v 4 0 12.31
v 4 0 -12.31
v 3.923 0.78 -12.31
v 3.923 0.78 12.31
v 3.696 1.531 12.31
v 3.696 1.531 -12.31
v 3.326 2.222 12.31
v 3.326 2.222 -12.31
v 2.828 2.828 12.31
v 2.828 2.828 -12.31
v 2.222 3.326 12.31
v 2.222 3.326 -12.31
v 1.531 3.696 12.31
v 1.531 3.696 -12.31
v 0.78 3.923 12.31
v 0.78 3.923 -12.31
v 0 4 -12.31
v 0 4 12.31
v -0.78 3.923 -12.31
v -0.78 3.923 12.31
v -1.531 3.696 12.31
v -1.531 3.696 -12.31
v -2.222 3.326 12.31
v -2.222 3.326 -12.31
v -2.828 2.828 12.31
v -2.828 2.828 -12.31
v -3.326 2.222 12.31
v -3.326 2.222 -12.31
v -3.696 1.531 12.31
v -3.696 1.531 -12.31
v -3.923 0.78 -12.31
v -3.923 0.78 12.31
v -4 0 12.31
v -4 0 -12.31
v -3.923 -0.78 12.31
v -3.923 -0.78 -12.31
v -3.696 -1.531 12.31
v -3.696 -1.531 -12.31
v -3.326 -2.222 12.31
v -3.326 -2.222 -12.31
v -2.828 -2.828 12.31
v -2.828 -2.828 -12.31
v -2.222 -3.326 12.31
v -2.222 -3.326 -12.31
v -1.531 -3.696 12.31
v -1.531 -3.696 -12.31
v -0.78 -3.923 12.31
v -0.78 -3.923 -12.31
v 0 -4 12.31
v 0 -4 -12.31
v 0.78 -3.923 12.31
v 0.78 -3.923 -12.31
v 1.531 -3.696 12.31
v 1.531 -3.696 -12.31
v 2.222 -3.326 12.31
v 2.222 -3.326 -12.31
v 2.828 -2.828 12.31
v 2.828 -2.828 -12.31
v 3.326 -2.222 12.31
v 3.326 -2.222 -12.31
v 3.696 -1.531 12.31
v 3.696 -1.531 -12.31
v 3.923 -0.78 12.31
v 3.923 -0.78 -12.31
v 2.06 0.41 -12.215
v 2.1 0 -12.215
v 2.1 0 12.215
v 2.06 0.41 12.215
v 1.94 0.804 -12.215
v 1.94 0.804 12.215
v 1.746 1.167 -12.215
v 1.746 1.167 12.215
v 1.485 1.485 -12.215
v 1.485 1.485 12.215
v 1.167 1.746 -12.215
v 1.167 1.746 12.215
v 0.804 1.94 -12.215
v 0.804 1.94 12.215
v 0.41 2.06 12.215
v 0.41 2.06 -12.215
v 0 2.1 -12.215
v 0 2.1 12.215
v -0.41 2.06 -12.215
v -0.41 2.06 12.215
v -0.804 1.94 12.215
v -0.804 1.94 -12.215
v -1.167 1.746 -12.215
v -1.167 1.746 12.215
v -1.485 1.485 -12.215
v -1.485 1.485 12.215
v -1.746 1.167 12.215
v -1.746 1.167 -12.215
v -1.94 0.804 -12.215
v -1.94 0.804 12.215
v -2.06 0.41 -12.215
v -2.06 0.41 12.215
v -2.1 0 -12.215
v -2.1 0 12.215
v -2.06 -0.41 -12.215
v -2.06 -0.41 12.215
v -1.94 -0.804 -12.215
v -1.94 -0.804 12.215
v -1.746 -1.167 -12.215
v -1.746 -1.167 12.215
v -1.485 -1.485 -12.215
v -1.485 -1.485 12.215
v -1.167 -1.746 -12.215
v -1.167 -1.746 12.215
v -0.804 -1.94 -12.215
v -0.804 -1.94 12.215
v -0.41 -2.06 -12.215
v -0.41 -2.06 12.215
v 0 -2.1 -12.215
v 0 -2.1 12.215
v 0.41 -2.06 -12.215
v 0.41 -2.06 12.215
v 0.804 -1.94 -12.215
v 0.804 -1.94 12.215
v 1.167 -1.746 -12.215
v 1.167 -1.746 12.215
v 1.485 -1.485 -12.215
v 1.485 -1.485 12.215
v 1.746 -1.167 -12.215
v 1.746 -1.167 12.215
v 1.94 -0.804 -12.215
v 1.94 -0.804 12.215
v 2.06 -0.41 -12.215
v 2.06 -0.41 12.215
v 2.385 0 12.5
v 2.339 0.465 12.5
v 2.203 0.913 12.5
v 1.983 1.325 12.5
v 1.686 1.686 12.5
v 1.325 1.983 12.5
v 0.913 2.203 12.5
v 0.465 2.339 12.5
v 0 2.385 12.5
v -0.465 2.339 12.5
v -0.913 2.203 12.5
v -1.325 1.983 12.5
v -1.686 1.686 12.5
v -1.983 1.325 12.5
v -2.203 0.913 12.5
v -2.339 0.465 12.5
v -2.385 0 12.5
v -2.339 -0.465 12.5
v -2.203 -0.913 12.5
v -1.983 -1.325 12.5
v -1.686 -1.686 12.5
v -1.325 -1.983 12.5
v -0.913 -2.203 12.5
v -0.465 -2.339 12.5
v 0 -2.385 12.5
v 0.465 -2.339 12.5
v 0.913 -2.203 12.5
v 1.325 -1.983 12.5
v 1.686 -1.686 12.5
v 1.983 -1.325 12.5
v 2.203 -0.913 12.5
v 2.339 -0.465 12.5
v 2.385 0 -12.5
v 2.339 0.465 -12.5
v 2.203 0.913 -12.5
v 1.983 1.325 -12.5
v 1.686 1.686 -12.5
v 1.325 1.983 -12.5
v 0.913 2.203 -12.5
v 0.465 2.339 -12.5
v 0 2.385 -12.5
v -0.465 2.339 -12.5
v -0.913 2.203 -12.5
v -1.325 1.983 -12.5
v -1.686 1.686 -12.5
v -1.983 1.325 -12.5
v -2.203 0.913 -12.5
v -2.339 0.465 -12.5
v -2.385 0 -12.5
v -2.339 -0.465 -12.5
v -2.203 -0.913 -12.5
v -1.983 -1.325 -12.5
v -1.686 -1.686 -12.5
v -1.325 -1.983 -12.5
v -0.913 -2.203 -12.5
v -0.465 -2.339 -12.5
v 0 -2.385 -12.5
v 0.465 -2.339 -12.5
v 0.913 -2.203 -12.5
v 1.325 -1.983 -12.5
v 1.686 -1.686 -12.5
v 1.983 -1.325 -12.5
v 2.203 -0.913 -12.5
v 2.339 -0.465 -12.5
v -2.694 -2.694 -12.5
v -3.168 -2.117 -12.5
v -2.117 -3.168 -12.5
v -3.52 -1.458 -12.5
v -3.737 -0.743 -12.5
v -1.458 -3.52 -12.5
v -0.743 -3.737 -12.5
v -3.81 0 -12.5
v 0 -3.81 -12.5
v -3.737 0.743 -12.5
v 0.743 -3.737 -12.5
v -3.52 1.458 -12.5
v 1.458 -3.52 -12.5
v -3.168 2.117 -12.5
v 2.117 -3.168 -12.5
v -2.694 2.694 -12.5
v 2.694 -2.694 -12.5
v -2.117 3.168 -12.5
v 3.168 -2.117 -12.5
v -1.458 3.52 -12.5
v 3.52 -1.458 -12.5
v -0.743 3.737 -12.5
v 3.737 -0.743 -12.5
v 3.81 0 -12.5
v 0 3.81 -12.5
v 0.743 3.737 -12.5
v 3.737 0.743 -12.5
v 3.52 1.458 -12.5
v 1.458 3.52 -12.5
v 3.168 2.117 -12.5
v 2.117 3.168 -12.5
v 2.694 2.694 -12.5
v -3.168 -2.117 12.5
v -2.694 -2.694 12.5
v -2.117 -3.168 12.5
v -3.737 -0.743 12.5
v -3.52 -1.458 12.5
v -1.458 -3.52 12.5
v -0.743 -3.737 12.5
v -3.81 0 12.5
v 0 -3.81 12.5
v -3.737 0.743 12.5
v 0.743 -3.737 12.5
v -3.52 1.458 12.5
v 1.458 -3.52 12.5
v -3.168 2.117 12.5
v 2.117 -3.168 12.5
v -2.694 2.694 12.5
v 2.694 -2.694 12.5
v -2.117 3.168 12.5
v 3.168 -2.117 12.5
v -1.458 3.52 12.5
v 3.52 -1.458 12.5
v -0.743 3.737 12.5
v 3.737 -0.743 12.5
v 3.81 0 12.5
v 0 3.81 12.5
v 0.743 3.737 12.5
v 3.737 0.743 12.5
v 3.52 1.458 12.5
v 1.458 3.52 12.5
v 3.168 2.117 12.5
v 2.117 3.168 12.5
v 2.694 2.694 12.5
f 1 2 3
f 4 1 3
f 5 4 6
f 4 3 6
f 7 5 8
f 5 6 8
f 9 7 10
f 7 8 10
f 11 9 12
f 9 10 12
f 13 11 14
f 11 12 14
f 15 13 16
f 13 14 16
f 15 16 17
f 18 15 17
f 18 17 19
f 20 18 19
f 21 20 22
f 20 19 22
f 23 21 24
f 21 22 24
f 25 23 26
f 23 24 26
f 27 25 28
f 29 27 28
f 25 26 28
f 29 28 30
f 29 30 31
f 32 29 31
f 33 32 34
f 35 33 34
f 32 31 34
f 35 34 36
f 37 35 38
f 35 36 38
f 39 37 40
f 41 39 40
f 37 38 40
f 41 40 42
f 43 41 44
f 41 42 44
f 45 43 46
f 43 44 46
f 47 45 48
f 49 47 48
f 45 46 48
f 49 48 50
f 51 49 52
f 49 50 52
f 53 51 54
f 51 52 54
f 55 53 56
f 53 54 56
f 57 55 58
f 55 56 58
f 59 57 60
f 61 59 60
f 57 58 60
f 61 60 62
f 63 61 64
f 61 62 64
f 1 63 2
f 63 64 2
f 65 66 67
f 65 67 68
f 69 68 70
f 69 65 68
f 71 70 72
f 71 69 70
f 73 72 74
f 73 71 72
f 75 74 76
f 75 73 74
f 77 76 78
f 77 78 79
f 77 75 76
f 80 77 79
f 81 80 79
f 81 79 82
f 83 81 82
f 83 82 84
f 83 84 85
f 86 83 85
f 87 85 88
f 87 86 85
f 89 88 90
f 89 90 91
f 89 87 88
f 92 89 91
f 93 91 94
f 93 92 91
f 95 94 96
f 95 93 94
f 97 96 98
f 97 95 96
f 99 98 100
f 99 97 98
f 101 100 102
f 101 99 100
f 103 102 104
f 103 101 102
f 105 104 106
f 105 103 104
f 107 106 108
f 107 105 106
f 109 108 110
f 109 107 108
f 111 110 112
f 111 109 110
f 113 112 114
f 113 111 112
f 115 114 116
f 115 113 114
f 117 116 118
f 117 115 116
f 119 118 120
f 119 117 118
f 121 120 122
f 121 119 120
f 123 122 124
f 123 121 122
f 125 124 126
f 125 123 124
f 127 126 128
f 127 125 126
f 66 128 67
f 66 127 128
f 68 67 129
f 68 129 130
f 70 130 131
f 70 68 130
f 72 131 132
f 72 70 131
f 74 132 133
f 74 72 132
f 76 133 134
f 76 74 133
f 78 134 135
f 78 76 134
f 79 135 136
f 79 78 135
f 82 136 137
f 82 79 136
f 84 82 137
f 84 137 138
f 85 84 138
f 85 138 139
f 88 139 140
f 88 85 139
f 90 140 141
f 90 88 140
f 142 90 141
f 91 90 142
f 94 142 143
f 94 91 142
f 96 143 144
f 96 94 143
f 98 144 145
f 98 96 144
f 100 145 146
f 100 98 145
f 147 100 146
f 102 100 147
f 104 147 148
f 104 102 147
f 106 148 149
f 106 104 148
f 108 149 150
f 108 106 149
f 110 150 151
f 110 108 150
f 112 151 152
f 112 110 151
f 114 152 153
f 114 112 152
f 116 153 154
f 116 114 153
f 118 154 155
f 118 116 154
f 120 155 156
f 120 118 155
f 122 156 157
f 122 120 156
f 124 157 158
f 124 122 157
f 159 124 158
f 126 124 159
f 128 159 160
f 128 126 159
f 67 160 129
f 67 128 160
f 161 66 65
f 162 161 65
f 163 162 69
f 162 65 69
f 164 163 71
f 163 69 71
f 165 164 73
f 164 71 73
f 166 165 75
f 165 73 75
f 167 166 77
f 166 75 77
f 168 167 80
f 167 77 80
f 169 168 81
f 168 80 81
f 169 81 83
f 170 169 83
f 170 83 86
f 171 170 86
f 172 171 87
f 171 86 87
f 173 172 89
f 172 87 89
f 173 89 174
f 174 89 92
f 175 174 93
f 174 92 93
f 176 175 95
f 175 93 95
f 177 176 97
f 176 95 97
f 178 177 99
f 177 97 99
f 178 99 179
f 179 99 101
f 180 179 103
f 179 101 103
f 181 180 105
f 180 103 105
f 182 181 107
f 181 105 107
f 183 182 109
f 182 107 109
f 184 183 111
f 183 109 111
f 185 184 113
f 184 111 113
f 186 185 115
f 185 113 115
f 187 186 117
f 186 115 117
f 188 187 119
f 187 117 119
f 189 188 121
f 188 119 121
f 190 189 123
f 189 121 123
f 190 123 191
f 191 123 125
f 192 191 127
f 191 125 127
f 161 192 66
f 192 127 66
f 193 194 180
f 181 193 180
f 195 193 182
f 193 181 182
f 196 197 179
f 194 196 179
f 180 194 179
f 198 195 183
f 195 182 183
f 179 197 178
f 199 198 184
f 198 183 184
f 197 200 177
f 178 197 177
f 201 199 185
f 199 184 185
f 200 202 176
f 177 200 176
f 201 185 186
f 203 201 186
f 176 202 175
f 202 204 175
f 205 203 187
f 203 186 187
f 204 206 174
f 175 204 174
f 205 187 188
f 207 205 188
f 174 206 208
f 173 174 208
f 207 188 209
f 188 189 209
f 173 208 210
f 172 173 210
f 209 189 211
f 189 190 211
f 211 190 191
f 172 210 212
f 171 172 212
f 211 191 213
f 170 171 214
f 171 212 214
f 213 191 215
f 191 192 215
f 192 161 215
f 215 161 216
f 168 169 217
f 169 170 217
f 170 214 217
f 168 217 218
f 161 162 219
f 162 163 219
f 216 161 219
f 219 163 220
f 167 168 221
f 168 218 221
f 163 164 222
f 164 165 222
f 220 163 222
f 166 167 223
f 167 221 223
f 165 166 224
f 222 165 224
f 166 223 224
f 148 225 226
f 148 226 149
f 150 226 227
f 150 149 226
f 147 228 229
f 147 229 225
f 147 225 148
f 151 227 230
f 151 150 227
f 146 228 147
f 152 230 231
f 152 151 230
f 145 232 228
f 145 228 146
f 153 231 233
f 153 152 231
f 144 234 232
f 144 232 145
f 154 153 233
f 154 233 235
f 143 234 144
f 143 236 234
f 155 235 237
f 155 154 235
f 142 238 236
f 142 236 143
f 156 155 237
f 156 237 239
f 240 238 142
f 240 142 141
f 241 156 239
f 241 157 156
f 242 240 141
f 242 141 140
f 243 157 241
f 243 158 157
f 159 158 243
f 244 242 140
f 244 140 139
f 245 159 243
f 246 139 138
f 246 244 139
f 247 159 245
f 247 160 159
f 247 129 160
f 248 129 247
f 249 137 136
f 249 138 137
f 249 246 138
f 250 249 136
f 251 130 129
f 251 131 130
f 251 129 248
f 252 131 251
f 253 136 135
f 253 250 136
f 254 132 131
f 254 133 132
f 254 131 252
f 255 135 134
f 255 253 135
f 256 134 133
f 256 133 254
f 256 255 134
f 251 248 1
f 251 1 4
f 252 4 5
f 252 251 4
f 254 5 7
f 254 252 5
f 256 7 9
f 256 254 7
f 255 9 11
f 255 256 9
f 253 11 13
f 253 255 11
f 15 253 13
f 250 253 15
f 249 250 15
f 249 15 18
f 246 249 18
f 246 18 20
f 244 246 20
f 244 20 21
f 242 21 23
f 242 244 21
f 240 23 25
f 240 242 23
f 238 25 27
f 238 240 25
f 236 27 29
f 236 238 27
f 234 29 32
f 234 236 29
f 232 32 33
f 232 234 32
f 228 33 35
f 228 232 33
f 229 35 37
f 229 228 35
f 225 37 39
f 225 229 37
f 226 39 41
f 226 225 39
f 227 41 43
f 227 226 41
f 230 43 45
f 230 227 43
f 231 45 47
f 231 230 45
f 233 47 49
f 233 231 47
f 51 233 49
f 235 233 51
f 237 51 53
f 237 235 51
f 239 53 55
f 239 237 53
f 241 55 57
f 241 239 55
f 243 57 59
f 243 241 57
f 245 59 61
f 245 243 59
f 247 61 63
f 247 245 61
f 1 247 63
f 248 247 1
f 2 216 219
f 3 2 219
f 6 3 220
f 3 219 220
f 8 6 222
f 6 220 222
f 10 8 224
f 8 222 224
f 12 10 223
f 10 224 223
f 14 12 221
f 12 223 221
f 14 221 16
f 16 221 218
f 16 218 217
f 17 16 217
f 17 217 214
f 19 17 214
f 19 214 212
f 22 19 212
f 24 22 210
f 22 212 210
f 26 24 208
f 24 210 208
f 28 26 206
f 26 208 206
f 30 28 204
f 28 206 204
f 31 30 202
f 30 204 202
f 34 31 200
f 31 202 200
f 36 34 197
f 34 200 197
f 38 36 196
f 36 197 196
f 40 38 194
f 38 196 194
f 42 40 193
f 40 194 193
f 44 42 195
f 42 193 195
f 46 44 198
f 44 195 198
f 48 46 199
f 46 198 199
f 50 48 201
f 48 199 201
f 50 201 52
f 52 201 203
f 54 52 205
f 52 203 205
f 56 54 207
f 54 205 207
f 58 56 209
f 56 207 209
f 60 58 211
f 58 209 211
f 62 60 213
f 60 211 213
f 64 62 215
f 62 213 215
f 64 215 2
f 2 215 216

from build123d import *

# Parameters (mm, degrees)
BOSS_EXTRUDE1_DEPTH      = 12.5
BOSS_EXTRUDE1_DEPTH_BACK = 12.5
SKETCH3_R                = 4
SKETCH3_R_2              = 2.1
CHAMFER1_SIZE            = 0.19
CHAMFER2_SIZE            = 0.285


with BuildPart() as part:
    # Sketch3 → Boss-Extrude1 (new, two sides: drawn at the far end of the back side and taken through both)
    with BuildSketch(Plane.XY.offset(-BOSS_EXTRUDE1_DEPTH_BACK)):
        Circle(SKETCH3_R)
        Circle(SKETCH3_R_2, mode=Mode.SUBTRACT)
    extrude(amount=BOSS_EXTRUDE1_DEPTH + BOSS_EXTRUDE1_DEPTH_BACK)

    # Chamfer1
    chamfer1_edges = [part.edges().sort_by_distance(p)[0] for p in [
        (-4, 0, -12.5),
        (-4, 0, 12.5),
    ]]
    chamfer(chamfer1_edges, length=CHAMFER1_SIZE)

    # Chamfer2
    chamfer2_edges = [part.edges().sort_by_distance(p)[0] for p in [
        (-2.1, 0, -12.5),
        (-2.1, 0, 12.5),
    ]]
    chamfer(chamfer2_edges, length=CHAMFER2_SIZE)


solid = part.part
